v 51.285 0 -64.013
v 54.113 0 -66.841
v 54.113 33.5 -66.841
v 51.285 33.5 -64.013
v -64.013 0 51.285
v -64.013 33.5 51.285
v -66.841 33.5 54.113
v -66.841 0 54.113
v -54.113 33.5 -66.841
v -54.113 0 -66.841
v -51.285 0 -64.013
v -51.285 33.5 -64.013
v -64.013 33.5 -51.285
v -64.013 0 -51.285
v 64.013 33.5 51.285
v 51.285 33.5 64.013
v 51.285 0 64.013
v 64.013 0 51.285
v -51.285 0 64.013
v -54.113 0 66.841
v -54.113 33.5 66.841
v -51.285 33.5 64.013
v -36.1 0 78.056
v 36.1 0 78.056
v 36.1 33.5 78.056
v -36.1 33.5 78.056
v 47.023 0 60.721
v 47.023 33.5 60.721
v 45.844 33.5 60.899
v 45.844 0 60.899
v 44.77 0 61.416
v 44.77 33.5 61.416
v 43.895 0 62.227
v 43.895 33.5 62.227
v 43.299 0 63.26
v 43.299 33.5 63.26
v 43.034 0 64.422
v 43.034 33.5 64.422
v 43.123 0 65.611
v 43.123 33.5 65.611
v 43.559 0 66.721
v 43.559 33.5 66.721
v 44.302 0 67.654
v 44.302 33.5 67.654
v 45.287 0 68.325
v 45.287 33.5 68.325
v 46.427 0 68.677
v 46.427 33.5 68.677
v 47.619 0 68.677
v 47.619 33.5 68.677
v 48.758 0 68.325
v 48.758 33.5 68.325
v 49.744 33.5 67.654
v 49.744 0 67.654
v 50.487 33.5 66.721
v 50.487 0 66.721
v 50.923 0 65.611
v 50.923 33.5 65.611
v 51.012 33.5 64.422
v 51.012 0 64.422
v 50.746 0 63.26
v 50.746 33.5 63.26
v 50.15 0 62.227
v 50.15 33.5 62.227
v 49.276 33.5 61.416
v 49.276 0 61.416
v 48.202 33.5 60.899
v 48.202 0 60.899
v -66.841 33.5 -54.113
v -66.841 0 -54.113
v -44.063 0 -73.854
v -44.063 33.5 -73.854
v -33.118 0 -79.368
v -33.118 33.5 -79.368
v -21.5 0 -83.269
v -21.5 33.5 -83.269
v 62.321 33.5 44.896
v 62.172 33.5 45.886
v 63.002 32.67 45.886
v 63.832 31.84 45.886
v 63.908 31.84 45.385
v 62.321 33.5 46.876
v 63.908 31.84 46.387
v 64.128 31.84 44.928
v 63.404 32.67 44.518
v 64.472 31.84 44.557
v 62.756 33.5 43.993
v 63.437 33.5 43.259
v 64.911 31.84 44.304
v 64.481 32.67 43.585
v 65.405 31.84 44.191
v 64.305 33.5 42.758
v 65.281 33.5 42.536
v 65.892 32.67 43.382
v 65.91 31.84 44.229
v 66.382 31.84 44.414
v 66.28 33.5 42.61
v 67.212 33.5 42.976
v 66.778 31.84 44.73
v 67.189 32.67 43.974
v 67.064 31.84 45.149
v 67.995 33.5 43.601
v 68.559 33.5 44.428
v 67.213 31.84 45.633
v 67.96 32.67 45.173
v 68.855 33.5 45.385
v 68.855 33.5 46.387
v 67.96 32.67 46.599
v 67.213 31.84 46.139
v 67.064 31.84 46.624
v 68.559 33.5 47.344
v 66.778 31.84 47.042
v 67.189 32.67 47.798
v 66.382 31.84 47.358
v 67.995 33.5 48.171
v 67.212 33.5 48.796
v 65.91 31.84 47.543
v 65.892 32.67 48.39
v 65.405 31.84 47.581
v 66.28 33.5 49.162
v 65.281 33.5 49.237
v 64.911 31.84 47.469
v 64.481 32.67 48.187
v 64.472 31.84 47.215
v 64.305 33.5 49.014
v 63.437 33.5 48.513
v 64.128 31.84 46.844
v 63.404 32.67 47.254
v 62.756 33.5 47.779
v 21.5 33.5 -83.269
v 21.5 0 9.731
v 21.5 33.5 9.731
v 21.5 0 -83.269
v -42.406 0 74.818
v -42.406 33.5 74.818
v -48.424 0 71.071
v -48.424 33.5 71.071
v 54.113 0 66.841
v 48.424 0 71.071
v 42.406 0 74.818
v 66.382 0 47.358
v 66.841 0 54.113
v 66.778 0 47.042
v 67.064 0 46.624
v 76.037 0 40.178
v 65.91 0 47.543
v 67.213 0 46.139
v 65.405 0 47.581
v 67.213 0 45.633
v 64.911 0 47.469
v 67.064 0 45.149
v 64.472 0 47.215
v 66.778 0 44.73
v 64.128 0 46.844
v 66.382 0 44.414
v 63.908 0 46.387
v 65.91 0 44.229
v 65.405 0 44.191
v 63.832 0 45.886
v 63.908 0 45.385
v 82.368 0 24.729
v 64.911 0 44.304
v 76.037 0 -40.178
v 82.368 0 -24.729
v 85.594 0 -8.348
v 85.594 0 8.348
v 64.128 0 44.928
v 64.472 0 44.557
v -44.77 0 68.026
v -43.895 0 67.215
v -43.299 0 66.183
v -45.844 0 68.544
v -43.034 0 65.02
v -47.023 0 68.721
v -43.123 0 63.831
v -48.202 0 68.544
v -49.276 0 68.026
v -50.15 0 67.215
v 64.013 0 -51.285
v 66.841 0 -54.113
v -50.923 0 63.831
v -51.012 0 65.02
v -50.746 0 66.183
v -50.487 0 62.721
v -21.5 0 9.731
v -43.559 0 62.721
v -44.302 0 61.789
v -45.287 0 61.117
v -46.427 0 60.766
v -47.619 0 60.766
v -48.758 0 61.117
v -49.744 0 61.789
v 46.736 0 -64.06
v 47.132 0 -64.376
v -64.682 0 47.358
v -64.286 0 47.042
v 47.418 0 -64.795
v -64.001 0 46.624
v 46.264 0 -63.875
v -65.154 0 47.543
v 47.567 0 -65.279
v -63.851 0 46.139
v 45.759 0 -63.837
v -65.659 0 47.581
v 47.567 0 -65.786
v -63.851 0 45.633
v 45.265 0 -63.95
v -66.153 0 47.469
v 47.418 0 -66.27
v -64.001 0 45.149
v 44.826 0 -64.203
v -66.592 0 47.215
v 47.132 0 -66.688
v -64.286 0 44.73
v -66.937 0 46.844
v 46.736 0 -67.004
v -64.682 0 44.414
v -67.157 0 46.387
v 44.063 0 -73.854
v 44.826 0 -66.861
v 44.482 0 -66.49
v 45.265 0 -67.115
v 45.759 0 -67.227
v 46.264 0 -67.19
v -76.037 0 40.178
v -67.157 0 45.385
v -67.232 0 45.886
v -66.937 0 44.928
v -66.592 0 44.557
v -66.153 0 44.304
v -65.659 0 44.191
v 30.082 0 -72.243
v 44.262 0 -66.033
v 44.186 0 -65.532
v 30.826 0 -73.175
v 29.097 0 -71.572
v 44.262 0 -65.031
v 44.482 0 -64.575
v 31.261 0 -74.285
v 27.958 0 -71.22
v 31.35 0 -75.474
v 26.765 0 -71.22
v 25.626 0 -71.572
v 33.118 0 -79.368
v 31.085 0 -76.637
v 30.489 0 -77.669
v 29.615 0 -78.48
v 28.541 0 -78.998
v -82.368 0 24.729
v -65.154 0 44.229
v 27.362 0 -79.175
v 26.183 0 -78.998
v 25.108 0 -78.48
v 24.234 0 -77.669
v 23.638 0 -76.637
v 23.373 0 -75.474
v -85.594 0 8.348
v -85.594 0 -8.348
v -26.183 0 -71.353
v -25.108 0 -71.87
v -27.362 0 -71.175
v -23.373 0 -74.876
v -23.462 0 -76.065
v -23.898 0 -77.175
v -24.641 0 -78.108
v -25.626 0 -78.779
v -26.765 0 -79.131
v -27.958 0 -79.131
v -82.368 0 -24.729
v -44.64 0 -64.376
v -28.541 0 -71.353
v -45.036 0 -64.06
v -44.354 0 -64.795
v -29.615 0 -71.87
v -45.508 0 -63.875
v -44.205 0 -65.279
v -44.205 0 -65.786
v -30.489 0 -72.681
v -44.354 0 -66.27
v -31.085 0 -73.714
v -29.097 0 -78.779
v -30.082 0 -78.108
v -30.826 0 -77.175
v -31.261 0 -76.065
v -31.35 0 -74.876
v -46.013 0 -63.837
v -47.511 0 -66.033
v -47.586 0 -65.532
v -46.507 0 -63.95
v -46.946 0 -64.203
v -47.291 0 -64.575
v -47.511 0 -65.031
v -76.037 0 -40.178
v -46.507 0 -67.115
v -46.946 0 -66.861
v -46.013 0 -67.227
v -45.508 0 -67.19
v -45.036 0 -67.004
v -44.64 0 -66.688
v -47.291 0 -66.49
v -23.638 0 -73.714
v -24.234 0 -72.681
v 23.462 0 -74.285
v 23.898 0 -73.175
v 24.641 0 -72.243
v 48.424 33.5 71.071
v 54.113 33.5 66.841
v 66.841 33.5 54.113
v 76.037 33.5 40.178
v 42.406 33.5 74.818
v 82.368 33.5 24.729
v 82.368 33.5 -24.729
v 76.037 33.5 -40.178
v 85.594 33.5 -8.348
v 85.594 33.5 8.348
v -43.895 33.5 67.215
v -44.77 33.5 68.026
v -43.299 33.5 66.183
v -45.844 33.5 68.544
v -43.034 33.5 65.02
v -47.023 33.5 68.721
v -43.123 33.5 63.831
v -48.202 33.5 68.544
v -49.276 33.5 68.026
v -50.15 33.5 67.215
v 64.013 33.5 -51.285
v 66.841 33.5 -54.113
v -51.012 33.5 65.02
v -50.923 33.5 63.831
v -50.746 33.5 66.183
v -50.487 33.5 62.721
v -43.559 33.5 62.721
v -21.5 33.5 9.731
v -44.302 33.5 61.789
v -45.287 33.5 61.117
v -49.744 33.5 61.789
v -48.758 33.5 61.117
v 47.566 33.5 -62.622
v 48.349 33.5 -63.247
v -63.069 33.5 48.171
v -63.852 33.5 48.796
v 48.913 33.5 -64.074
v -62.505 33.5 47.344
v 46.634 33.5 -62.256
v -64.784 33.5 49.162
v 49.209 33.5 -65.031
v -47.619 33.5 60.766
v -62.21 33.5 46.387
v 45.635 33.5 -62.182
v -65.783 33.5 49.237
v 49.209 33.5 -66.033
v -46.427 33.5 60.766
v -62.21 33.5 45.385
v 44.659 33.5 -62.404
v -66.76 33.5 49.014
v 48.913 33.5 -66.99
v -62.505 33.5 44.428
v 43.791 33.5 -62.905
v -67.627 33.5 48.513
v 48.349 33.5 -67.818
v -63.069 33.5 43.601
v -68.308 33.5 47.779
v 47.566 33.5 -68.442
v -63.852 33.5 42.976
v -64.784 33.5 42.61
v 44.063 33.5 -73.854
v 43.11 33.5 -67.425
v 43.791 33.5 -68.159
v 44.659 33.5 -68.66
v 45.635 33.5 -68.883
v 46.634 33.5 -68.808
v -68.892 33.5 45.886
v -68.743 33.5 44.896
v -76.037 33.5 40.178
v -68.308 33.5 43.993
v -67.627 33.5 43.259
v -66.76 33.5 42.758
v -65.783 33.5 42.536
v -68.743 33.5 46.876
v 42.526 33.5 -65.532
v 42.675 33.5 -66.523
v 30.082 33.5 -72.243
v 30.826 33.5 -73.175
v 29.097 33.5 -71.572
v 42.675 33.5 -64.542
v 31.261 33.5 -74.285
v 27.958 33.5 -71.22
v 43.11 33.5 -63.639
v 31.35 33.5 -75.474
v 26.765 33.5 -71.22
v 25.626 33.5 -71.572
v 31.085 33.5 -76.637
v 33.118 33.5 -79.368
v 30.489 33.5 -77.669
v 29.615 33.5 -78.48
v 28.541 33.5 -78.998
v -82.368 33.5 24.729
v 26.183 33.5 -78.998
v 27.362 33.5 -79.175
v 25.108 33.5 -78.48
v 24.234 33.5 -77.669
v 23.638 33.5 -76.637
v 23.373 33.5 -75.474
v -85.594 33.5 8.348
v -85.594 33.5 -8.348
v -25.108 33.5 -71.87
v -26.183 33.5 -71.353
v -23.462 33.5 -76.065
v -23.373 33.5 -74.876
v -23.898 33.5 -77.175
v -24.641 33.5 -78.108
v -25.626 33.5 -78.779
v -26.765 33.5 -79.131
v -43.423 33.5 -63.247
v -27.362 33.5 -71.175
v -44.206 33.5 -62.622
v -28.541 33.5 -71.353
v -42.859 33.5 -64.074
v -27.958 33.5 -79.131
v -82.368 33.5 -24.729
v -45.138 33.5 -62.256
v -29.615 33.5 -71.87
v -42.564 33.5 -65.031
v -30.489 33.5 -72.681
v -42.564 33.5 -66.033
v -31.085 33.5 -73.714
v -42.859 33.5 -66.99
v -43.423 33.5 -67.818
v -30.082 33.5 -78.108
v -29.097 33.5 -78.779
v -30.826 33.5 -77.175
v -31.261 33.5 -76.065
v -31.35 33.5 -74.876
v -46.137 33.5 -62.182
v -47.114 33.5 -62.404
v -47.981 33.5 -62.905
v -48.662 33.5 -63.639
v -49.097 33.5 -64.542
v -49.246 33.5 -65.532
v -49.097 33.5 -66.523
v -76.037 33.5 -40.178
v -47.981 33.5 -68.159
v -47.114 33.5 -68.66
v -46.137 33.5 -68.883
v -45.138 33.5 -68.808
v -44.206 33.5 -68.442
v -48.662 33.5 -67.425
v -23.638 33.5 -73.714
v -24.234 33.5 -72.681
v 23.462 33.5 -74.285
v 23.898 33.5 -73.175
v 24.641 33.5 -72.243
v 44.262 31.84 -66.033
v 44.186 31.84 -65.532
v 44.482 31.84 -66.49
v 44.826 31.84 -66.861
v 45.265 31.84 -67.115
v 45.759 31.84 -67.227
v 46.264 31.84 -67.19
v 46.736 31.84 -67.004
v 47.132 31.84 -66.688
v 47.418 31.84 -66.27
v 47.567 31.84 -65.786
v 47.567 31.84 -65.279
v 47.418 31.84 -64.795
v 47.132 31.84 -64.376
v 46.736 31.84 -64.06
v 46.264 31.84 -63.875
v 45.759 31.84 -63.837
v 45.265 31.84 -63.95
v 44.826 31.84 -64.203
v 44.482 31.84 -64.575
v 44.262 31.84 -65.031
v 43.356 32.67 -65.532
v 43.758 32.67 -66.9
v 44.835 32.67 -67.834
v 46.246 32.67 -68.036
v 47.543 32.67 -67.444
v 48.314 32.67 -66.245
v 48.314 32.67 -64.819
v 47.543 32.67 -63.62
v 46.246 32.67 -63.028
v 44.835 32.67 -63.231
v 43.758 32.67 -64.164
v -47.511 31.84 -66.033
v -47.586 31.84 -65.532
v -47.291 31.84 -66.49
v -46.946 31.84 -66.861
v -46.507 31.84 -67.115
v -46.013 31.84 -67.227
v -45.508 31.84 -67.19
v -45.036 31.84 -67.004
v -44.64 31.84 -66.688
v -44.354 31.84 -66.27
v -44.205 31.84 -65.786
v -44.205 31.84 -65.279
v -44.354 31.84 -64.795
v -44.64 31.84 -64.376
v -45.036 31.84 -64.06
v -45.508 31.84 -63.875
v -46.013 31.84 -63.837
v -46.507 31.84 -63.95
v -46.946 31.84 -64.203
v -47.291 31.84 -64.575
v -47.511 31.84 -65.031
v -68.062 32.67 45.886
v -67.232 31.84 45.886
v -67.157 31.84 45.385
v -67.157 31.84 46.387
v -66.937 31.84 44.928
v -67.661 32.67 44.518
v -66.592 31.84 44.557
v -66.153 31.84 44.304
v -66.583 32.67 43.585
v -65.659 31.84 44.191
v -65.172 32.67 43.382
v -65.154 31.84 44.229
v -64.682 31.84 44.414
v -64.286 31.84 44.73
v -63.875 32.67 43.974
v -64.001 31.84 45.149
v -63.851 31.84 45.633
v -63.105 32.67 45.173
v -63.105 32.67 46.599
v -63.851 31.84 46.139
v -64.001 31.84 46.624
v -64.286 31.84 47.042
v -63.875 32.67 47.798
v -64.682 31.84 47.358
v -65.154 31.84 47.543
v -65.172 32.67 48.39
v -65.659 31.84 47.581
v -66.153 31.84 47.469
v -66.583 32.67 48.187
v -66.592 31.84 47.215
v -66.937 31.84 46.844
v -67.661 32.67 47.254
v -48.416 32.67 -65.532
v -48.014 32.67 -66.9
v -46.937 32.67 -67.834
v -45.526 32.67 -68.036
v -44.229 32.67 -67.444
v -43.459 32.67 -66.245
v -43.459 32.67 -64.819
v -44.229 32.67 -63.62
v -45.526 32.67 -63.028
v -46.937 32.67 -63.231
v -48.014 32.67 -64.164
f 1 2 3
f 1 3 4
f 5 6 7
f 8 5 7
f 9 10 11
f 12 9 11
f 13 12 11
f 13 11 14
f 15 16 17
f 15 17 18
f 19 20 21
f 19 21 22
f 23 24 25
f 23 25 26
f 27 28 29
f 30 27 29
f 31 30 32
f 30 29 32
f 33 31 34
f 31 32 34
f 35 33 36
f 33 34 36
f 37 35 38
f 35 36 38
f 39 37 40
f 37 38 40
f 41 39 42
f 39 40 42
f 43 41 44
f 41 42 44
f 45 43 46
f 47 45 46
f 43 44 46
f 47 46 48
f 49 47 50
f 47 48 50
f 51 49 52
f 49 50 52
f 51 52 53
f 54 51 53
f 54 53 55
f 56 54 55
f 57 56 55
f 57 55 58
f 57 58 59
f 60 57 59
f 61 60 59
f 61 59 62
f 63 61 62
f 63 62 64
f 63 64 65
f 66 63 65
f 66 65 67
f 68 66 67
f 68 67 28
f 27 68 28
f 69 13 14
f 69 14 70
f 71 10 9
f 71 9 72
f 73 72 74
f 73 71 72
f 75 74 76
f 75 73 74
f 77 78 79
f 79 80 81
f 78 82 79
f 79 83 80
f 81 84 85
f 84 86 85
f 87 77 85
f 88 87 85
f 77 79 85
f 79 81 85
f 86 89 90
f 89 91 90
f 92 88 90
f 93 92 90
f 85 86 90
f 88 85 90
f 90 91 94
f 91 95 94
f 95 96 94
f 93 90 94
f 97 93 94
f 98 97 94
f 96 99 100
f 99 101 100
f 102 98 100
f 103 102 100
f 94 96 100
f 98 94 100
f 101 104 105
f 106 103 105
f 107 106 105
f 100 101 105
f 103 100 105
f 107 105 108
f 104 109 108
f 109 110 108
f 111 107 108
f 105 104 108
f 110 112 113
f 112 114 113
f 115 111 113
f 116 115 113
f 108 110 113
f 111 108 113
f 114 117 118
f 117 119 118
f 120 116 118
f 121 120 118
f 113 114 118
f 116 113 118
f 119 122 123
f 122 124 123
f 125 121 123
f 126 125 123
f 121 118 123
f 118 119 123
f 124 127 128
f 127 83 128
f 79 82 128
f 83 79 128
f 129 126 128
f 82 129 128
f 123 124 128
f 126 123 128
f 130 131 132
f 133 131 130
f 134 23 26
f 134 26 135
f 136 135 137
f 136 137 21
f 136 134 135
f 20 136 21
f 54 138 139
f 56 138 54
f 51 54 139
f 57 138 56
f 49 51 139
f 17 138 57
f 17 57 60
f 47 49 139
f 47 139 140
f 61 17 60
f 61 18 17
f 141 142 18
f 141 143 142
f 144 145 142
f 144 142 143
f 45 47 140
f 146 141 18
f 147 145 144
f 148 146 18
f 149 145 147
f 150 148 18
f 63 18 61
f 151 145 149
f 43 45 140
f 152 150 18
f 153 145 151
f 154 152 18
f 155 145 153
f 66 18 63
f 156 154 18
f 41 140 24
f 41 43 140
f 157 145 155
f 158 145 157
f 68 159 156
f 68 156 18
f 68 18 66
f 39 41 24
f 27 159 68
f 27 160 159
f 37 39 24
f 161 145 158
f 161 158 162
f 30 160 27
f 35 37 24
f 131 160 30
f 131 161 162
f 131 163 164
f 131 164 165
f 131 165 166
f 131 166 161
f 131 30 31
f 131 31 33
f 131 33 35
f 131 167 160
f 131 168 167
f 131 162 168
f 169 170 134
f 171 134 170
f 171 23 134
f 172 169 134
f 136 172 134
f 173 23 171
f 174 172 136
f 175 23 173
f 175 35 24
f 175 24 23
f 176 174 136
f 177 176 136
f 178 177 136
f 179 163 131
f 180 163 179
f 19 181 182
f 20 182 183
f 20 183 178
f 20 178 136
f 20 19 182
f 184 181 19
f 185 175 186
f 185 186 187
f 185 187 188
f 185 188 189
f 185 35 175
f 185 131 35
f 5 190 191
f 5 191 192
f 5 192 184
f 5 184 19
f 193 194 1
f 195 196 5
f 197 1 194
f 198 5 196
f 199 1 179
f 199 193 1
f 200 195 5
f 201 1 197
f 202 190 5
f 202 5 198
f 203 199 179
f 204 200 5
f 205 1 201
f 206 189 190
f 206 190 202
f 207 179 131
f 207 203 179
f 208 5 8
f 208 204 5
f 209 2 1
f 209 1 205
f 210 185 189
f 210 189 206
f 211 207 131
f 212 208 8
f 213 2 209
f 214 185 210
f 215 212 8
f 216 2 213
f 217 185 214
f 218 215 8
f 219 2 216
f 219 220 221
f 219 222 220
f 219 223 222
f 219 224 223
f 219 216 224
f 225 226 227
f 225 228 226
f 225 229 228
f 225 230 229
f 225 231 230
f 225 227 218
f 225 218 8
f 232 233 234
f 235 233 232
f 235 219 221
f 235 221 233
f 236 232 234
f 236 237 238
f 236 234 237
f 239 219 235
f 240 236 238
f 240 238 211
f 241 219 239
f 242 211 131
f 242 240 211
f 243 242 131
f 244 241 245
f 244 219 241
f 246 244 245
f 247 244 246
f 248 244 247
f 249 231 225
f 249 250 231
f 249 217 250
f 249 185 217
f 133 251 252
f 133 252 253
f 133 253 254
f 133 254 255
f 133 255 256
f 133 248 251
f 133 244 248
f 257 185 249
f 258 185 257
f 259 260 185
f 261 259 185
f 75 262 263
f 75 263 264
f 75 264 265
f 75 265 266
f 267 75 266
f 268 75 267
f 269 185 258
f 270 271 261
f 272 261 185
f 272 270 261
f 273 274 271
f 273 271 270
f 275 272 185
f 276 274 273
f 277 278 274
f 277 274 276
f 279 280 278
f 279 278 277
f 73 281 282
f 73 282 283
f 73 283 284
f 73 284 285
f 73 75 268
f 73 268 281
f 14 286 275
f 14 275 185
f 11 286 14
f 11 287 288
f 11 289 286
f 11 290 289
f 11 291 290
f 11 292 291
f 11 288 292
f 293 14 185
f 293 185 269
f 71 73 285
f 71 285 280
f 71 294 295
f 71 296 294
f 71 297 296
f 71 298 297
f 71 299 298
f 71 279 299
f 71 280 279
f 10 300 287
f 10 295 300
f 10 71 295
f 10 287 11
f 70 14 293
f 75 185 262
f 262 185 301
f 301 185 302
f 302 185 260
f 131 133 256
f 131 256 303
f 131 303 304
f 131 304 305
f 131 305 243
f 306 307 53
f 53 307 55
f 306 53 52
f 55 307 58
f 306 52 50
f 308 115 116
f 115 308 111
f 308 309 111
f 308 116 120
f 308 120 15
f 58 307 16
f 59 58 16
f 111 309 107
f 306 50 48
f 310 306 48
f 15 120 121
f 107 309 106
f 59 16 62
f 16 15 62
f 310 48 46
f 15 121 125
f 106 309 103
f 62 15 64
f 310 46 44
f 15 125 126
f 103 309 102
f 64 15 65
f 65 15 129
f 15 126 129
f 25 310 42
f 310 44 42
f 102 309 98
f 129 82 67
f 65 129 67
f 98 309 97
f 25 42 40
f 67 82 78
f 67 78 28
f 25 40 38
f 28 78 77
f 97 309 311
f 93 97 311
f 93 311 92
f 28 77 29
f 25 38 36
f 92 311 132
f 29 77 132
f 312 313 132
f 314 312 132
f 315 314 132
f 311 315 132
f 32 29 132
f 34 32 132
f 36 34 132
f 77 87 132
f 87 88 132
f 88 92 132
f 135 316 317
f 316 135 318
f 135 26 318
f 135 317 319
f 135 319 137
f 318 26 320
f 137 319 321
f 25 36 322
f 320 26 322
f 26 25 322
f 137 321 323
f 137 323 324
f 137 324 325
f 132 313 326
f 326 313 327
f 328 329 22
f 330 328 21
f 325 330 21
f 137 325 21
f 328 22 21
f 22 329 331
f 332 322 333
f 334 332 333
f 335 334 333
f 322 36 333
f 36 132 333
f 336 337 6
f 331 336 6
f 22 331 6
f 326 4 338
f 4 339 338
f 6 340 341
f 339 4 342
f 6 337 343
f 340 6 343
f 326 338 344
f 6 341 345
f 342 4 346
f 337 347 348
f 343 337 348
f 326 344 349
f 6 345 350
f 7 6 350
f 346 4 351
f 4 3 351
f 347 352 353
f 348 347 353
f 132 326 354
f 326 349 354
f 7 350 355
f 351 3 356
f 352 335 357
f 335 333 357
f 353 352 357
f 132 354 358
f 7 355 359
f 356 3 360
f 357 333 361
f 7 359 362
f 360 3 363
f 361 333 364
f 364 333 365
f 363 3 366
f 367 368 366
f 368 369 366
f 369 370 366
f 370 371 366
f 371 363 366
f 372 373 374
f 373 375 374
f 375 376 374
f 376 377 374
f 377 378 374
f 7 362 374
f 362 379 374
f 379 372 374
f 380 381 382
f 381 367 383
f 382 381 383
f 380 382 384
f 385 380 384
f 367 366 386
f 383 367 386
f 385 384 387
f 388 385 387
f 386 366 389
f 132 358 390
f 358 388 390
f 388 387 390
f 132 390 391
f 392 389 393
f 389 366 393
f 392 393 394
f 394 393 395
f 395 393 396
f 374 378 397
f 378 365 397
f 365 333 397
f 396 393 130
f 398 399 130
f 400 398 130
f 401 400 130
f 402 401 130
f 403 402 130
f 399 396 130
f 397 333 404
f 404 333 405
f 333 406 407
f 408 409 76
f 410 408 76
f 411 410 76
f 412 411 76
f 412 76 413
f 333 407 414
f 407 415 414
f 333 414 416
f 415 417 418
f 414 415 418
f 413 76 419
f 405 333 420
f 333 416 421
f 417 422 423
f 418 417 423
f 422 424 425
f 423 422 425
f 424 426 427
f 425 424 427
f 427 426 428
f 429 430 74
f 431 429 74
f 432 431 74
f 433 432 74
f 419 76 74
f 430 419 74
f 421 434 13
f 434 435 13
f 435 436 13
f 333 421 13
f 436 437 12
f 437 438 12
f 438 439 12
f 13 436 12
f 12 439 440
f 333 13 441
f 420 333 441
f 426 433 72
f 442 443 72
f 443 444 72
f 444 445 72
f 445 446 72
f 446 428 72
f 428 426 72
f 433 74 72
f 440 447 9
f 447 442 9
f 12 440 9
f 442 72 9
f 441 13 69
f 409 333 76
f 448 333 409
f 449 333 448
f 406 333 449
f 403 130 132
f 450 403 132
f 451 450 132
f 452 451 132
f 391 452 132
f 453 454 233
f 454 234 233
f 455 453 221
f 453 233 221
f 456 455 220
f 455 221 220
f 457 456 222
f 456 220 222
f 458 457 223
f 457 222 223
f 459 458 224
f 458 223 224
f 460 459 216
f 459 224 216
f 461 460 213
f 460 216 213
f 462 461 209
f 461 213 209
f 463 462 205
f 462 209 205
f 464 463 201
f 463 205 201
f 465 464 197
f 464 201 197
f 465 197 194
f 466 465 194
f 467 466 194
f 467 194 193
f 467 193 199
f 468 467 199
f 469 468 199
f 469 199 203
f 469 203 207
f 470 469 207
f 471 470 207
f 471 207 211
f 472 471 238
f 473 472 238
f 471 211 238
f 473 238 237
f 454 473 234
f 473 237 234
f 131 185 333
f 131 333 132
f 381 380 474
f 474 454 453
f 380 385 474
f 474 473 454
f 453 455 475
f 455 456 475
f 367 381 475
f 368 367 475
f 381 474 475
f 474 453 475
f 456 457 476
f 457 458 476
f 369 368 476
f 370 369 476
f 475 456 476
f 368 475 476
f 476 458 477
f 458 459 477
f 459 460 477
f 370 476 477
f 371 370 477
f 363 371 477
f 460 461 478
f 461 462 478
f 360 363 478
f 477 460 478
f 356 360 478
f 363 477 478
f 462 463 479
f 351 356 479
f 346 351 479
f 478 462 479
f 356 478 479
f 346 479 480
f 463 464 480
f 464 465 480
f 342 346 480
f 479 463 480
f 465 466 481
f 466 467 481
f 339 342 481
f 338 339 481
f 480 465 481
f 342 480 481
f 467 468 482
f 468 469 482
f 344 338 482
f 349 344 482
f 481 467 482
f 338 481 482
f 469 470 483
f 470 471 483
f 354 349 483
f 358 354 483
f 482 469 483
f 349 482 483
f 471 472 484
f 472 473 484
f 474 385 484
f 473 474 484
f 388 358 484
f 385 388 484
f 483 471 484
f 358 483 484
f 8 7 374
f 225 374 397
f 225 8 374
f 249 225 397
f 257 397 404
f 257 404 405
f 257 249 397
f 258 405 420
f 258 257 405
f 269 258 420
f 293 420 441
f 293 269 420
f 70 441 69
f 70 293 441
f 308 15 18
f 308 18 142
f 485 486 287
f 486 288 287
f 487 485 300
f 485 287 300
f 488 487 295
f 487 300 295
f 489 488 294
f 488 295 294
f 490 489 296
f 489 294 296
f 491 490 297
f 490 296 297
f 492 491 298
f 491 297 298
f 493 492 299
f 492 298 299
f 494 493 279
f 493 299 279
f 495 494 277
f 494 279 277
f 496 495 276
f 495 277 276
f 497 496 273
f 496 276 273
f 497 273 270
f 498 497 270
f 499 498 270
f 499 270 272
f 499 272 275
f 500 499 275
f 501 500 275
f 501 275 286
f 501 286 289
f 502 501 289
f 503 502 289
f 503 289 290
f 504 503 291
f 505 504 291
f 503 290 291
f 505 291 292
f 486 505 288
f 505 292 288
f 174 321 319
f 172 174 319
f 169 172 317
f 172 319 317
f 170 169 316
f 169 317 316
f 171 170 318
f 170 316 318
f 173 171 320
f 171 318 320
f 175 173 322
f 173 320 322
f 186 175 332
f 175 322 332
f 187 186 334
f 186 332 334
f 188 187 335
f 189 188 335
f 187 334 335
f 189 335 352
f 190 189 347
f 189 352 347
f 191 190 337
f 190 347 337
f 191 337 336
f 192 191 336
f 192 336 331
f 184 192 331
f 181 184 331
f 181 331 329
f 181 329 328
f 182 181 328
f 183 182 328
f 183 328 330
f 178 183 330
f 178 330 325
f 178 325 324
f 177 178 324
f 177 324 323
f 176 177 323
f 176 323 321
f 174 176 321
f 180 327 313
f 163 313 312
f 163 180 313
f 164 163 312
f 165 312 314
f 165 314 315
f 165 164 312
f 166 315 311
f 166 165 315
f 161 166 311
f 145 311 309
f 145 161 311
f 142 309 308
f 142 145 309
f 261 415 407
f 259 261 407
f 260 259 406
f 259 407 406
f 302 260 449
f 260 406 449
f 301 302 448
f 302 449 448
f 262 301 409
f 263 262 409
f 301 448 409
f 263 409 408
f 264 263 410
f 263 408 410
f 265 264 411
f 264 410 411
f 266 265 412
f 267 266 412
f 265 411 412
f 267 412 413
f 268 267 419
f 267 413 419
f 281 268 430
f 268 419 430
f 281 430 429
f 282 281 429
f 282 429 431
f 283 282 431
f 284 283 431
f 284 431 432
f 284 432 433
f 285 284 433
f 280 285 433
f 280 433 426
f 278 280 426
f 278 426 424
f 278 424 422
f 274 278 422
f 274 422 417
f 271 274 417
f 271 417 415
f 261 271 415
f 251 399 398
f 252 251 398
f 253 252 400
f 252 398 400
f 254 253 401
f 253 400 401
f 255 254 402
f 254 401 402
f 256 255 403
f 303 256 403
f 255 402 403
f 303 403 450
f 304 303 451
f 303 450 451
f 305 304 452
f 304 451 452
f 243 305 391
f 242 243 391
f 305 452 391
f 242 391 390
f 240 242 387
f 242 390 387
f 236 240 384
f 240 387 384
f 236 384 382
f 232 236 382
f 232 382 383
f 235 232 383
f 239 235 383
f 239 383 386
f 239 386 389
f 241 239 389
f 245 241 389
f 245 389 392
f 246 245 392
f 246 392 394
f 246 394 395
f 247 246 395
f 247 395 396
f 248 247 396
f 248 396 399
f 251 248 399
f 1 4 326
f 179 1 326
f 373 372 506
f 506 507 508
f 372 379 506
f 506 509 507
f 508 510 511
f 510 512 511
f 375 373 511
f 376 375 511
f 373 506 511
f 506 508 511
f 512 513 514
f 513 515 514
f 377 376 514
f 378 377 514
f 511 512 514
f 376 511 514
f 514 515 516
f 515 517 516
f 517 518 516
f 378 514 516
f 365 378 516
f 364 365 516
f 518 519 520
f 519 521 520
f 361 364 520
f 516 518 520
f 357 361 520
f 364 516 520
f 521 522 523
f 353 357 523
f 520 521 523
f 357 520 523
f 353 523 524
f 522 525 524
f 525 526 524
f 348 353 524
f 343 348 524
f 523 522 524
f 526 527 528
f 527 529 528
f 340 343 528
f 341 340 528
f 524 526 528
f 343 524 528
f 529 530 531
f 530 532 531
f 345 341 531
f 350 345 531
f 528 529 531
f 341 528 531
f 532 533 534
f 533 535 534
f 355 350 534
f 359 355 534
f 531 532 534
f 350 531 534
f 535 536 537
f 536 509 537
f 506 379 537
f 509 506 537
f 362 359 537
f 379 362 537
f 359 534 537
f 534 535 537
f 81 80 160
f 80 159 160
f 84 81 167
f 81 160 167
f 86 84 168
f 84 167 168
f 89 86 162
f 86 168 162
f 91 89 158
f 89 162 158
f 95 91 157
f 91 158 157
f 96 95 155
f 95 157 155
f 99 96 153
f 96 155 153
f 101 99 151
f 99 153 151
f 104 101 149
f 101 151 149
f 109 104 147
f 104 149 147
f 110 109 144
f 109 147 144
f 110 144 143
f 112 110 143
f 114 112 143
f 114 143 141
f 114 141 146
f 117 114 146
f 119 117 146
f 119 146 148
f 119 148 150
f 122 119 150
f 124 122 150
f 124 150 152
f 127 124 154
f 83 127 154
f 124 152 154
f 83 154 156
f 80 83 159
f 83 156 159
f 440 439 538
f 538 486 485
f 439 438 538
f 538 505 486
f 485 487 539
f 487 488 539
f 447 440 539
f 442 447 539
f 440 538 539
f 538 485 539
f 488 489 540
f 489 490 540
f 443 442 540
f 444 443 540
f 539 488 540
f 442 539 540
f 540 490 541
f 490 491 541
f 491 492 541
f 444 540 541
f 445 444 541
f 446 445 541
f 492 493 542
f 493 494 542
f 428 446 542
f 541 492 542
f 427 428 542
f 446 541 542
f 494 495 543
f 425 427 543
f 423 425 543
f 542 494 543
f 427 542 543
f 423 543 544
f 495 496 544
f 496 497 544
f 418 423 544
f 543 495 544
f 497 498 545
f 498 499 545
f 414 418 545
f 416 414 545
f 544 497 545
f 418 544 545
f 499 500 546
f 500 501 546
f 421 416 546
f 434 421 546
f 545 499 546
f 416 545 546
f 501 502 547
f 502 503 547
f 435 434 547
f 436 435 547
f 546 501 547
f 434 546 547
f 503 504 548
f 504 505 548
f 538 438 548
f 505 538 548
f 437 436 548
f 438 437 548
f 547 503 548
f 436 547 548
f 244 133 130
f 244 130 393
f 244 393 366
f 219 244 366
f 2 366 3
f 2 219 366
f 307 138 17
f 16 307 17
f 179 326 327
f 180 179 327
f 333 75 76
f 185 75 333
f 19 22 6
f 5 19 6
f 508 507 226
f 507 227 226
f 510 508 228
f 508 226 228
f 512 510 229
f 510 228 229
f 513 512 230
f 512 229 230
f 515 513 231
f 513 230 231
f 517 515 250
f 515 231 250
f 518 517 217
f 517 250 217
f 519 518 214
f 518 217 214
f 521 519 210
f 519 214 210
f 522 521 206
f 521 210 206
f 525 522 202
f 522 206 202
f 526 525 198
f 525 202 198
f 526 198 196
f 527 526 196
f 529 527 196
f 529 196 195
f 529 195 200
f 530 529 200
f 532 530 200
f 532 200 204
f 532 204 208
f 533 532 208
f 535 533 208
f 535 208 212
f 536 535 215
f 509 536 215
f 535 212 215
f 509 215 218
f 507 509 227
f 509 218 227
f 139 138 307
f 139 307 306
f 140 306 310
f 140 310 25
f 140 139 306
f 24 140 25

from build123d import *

# Parameters (mm, degrees)
RESSALTO_EXTRUS_O2_DEPTH             = 33.5
ESCAREADO_PARA_SFHCS_M31_D           = 3.4
ESCAREADO_PARA_SFHCS_M31_CSINK_D     = 6.72
ESCAREADO_PARA_SFHCS_M31_CSINK_ANGLE = 90
ESBO_O7_R                            = 4
CORTE_EXTRUS_O1_DEPTH                = 125.306073866
CORTE_EXTRUS_O2_DEPTH                = 125.306073866


with BuildPart() as part:
    # Esboço3 → Ressalto-extrusão2 (new body)
    with BuildSketch(Plane(origin=(0, 0, 0), x_dir=(1, 0, 0), z_dir=(0, 1, 0))):
        with BuildLine():
            Line((-21.5, 83.269141943), (-21.5, -9.730858057))
            Line((-21.5, -9.730858057), (21.5, -9.730858057))
            Line((21.5, -9.730858057), (21.5, 83.269141943))
            ThreePointArc((21.5, 83.269141943), (38.688656502, 76.806170703), (54.113307426, 66.841229488))
            Line((54.113307426, 66.841229488), (66.841229488, 54.113307426))
            ThreePointArc((66.841229488, 54.113307426), (86, 0), (66.841229488, -54.113307426))
            Line((66.841229488, -54.113307426), (54.113307426, -66.841229488))
            ThreePointArc((54.113307426, -66.841229488), (45.453875584, -73.006473647), (36.1, -78.056325817))
            Line((36.1, -78.056325817), (-36.1, -78.056325817))
            ThreePointArc((-36.1, -78.056325817), (-45.453875584, -73.006473647), (-54.113307426, -66.841229488))
            Line((-54.113307426, -66.841229488), (-66.841229488, -54.113307426))
            ThreePointArc((-66.841229488, -54.113307426), (-86, 0), (-66.841229488, 54.113307426))
            Line((-66.841229488, 54.113307426), (-54.113307426, 66.841229488))
            ThreePointArc((-54.113307426, 66.841229488), (-38.688656502, 76.806170703), (-21.5, 83.269141943))
        make_face()
    extrude(amount=RESSALTO_EXTRUS_O2_DEPTH)

    # Escareado para SFHCS M31 (through all)
    with Locations(Plane(origin=(0, 33.5, 0), x_dir=(1, 0, 0), z_dir=(0, 1, 0))):
        with Locations((45.886114908, 65.532163543), (65.532163543, -45.886114908), (-65.532163543, -45.886114908), (-45.886114908, 65.532163543)):
            CounterSinkHole(ESCAREADO_PARA_SFHCS_M31_D / 2, ESCAREADO_PARA_SFHCS_M31_CSINK_D / 2, counter_sink_angle=ESCAREADO_PARA_SFHCS_M31_CSINK_ANGLE)

    # Esboço7 → Corte-extrusão1 (cut, through all)
    with BuildSketch(Plane(origin=(0, 33.5, 0), x_dir=(1, 0, 0), z_dir=(0, 1, 0))):
        with Locations(Location((-27.361611466, 75.175409663, 0), (0, 0, 270))):
            Circle(ESBO_O7_R)
        with Locations(Location((-47.022820183, -64.72135955, 0), (0, 0, 270))):
            Circle(ESBO_O7_R)
        with Locations(Location((47.022820183, -64.72135955, 0), (0, 0, 90))):
            Circle(ESBO_O7_R)
        with Locations(Location((27.361611466, 75.175409663, 0), (0, 0, 90))):
            Circle(ESBO_O7_R)
    extrude(amount=-CORTE_EXTRUS_O1_DEPTH, mode=Mode.SUBTRACT)

    # Esboço9 → Corte-extrusão2 (cut, through all)
    with BuildSketch(Plane(origin=(0, 33.5, 0), x_dir=(1, 0, 0), z_dir=(0, 1, 0))):
        Polygon((-66.841229488, -54.113307426), (-54.113307426, -66.841229488), (-51.284880301, -64.012802363), (-64.012802363, -51.284880301), align=None)
        Polygon((51.284880301, -64.012802363), (64.012802363, -51.284880301), (66.841229488, -54.113307426), (54.113307426, -66.841229488), align=None)
        Polygon((54.113307426, 66.841229488), (51.284880301, 64.012802363), (64.012802363, 51.284880301), (66.841229488, 54.113307426), align=None)
        Polygon((-51.284880301, 64.012802363), (-64.012802363, 51.284880301), (-66.841229488, 54.113307426), (-54.113307426, 66.841229488), align=None)
    extrude(amount=-CORTE_EXTRUS_O2_DEPTH, mode=Mode.SUBTRACT)


solid = part.part
